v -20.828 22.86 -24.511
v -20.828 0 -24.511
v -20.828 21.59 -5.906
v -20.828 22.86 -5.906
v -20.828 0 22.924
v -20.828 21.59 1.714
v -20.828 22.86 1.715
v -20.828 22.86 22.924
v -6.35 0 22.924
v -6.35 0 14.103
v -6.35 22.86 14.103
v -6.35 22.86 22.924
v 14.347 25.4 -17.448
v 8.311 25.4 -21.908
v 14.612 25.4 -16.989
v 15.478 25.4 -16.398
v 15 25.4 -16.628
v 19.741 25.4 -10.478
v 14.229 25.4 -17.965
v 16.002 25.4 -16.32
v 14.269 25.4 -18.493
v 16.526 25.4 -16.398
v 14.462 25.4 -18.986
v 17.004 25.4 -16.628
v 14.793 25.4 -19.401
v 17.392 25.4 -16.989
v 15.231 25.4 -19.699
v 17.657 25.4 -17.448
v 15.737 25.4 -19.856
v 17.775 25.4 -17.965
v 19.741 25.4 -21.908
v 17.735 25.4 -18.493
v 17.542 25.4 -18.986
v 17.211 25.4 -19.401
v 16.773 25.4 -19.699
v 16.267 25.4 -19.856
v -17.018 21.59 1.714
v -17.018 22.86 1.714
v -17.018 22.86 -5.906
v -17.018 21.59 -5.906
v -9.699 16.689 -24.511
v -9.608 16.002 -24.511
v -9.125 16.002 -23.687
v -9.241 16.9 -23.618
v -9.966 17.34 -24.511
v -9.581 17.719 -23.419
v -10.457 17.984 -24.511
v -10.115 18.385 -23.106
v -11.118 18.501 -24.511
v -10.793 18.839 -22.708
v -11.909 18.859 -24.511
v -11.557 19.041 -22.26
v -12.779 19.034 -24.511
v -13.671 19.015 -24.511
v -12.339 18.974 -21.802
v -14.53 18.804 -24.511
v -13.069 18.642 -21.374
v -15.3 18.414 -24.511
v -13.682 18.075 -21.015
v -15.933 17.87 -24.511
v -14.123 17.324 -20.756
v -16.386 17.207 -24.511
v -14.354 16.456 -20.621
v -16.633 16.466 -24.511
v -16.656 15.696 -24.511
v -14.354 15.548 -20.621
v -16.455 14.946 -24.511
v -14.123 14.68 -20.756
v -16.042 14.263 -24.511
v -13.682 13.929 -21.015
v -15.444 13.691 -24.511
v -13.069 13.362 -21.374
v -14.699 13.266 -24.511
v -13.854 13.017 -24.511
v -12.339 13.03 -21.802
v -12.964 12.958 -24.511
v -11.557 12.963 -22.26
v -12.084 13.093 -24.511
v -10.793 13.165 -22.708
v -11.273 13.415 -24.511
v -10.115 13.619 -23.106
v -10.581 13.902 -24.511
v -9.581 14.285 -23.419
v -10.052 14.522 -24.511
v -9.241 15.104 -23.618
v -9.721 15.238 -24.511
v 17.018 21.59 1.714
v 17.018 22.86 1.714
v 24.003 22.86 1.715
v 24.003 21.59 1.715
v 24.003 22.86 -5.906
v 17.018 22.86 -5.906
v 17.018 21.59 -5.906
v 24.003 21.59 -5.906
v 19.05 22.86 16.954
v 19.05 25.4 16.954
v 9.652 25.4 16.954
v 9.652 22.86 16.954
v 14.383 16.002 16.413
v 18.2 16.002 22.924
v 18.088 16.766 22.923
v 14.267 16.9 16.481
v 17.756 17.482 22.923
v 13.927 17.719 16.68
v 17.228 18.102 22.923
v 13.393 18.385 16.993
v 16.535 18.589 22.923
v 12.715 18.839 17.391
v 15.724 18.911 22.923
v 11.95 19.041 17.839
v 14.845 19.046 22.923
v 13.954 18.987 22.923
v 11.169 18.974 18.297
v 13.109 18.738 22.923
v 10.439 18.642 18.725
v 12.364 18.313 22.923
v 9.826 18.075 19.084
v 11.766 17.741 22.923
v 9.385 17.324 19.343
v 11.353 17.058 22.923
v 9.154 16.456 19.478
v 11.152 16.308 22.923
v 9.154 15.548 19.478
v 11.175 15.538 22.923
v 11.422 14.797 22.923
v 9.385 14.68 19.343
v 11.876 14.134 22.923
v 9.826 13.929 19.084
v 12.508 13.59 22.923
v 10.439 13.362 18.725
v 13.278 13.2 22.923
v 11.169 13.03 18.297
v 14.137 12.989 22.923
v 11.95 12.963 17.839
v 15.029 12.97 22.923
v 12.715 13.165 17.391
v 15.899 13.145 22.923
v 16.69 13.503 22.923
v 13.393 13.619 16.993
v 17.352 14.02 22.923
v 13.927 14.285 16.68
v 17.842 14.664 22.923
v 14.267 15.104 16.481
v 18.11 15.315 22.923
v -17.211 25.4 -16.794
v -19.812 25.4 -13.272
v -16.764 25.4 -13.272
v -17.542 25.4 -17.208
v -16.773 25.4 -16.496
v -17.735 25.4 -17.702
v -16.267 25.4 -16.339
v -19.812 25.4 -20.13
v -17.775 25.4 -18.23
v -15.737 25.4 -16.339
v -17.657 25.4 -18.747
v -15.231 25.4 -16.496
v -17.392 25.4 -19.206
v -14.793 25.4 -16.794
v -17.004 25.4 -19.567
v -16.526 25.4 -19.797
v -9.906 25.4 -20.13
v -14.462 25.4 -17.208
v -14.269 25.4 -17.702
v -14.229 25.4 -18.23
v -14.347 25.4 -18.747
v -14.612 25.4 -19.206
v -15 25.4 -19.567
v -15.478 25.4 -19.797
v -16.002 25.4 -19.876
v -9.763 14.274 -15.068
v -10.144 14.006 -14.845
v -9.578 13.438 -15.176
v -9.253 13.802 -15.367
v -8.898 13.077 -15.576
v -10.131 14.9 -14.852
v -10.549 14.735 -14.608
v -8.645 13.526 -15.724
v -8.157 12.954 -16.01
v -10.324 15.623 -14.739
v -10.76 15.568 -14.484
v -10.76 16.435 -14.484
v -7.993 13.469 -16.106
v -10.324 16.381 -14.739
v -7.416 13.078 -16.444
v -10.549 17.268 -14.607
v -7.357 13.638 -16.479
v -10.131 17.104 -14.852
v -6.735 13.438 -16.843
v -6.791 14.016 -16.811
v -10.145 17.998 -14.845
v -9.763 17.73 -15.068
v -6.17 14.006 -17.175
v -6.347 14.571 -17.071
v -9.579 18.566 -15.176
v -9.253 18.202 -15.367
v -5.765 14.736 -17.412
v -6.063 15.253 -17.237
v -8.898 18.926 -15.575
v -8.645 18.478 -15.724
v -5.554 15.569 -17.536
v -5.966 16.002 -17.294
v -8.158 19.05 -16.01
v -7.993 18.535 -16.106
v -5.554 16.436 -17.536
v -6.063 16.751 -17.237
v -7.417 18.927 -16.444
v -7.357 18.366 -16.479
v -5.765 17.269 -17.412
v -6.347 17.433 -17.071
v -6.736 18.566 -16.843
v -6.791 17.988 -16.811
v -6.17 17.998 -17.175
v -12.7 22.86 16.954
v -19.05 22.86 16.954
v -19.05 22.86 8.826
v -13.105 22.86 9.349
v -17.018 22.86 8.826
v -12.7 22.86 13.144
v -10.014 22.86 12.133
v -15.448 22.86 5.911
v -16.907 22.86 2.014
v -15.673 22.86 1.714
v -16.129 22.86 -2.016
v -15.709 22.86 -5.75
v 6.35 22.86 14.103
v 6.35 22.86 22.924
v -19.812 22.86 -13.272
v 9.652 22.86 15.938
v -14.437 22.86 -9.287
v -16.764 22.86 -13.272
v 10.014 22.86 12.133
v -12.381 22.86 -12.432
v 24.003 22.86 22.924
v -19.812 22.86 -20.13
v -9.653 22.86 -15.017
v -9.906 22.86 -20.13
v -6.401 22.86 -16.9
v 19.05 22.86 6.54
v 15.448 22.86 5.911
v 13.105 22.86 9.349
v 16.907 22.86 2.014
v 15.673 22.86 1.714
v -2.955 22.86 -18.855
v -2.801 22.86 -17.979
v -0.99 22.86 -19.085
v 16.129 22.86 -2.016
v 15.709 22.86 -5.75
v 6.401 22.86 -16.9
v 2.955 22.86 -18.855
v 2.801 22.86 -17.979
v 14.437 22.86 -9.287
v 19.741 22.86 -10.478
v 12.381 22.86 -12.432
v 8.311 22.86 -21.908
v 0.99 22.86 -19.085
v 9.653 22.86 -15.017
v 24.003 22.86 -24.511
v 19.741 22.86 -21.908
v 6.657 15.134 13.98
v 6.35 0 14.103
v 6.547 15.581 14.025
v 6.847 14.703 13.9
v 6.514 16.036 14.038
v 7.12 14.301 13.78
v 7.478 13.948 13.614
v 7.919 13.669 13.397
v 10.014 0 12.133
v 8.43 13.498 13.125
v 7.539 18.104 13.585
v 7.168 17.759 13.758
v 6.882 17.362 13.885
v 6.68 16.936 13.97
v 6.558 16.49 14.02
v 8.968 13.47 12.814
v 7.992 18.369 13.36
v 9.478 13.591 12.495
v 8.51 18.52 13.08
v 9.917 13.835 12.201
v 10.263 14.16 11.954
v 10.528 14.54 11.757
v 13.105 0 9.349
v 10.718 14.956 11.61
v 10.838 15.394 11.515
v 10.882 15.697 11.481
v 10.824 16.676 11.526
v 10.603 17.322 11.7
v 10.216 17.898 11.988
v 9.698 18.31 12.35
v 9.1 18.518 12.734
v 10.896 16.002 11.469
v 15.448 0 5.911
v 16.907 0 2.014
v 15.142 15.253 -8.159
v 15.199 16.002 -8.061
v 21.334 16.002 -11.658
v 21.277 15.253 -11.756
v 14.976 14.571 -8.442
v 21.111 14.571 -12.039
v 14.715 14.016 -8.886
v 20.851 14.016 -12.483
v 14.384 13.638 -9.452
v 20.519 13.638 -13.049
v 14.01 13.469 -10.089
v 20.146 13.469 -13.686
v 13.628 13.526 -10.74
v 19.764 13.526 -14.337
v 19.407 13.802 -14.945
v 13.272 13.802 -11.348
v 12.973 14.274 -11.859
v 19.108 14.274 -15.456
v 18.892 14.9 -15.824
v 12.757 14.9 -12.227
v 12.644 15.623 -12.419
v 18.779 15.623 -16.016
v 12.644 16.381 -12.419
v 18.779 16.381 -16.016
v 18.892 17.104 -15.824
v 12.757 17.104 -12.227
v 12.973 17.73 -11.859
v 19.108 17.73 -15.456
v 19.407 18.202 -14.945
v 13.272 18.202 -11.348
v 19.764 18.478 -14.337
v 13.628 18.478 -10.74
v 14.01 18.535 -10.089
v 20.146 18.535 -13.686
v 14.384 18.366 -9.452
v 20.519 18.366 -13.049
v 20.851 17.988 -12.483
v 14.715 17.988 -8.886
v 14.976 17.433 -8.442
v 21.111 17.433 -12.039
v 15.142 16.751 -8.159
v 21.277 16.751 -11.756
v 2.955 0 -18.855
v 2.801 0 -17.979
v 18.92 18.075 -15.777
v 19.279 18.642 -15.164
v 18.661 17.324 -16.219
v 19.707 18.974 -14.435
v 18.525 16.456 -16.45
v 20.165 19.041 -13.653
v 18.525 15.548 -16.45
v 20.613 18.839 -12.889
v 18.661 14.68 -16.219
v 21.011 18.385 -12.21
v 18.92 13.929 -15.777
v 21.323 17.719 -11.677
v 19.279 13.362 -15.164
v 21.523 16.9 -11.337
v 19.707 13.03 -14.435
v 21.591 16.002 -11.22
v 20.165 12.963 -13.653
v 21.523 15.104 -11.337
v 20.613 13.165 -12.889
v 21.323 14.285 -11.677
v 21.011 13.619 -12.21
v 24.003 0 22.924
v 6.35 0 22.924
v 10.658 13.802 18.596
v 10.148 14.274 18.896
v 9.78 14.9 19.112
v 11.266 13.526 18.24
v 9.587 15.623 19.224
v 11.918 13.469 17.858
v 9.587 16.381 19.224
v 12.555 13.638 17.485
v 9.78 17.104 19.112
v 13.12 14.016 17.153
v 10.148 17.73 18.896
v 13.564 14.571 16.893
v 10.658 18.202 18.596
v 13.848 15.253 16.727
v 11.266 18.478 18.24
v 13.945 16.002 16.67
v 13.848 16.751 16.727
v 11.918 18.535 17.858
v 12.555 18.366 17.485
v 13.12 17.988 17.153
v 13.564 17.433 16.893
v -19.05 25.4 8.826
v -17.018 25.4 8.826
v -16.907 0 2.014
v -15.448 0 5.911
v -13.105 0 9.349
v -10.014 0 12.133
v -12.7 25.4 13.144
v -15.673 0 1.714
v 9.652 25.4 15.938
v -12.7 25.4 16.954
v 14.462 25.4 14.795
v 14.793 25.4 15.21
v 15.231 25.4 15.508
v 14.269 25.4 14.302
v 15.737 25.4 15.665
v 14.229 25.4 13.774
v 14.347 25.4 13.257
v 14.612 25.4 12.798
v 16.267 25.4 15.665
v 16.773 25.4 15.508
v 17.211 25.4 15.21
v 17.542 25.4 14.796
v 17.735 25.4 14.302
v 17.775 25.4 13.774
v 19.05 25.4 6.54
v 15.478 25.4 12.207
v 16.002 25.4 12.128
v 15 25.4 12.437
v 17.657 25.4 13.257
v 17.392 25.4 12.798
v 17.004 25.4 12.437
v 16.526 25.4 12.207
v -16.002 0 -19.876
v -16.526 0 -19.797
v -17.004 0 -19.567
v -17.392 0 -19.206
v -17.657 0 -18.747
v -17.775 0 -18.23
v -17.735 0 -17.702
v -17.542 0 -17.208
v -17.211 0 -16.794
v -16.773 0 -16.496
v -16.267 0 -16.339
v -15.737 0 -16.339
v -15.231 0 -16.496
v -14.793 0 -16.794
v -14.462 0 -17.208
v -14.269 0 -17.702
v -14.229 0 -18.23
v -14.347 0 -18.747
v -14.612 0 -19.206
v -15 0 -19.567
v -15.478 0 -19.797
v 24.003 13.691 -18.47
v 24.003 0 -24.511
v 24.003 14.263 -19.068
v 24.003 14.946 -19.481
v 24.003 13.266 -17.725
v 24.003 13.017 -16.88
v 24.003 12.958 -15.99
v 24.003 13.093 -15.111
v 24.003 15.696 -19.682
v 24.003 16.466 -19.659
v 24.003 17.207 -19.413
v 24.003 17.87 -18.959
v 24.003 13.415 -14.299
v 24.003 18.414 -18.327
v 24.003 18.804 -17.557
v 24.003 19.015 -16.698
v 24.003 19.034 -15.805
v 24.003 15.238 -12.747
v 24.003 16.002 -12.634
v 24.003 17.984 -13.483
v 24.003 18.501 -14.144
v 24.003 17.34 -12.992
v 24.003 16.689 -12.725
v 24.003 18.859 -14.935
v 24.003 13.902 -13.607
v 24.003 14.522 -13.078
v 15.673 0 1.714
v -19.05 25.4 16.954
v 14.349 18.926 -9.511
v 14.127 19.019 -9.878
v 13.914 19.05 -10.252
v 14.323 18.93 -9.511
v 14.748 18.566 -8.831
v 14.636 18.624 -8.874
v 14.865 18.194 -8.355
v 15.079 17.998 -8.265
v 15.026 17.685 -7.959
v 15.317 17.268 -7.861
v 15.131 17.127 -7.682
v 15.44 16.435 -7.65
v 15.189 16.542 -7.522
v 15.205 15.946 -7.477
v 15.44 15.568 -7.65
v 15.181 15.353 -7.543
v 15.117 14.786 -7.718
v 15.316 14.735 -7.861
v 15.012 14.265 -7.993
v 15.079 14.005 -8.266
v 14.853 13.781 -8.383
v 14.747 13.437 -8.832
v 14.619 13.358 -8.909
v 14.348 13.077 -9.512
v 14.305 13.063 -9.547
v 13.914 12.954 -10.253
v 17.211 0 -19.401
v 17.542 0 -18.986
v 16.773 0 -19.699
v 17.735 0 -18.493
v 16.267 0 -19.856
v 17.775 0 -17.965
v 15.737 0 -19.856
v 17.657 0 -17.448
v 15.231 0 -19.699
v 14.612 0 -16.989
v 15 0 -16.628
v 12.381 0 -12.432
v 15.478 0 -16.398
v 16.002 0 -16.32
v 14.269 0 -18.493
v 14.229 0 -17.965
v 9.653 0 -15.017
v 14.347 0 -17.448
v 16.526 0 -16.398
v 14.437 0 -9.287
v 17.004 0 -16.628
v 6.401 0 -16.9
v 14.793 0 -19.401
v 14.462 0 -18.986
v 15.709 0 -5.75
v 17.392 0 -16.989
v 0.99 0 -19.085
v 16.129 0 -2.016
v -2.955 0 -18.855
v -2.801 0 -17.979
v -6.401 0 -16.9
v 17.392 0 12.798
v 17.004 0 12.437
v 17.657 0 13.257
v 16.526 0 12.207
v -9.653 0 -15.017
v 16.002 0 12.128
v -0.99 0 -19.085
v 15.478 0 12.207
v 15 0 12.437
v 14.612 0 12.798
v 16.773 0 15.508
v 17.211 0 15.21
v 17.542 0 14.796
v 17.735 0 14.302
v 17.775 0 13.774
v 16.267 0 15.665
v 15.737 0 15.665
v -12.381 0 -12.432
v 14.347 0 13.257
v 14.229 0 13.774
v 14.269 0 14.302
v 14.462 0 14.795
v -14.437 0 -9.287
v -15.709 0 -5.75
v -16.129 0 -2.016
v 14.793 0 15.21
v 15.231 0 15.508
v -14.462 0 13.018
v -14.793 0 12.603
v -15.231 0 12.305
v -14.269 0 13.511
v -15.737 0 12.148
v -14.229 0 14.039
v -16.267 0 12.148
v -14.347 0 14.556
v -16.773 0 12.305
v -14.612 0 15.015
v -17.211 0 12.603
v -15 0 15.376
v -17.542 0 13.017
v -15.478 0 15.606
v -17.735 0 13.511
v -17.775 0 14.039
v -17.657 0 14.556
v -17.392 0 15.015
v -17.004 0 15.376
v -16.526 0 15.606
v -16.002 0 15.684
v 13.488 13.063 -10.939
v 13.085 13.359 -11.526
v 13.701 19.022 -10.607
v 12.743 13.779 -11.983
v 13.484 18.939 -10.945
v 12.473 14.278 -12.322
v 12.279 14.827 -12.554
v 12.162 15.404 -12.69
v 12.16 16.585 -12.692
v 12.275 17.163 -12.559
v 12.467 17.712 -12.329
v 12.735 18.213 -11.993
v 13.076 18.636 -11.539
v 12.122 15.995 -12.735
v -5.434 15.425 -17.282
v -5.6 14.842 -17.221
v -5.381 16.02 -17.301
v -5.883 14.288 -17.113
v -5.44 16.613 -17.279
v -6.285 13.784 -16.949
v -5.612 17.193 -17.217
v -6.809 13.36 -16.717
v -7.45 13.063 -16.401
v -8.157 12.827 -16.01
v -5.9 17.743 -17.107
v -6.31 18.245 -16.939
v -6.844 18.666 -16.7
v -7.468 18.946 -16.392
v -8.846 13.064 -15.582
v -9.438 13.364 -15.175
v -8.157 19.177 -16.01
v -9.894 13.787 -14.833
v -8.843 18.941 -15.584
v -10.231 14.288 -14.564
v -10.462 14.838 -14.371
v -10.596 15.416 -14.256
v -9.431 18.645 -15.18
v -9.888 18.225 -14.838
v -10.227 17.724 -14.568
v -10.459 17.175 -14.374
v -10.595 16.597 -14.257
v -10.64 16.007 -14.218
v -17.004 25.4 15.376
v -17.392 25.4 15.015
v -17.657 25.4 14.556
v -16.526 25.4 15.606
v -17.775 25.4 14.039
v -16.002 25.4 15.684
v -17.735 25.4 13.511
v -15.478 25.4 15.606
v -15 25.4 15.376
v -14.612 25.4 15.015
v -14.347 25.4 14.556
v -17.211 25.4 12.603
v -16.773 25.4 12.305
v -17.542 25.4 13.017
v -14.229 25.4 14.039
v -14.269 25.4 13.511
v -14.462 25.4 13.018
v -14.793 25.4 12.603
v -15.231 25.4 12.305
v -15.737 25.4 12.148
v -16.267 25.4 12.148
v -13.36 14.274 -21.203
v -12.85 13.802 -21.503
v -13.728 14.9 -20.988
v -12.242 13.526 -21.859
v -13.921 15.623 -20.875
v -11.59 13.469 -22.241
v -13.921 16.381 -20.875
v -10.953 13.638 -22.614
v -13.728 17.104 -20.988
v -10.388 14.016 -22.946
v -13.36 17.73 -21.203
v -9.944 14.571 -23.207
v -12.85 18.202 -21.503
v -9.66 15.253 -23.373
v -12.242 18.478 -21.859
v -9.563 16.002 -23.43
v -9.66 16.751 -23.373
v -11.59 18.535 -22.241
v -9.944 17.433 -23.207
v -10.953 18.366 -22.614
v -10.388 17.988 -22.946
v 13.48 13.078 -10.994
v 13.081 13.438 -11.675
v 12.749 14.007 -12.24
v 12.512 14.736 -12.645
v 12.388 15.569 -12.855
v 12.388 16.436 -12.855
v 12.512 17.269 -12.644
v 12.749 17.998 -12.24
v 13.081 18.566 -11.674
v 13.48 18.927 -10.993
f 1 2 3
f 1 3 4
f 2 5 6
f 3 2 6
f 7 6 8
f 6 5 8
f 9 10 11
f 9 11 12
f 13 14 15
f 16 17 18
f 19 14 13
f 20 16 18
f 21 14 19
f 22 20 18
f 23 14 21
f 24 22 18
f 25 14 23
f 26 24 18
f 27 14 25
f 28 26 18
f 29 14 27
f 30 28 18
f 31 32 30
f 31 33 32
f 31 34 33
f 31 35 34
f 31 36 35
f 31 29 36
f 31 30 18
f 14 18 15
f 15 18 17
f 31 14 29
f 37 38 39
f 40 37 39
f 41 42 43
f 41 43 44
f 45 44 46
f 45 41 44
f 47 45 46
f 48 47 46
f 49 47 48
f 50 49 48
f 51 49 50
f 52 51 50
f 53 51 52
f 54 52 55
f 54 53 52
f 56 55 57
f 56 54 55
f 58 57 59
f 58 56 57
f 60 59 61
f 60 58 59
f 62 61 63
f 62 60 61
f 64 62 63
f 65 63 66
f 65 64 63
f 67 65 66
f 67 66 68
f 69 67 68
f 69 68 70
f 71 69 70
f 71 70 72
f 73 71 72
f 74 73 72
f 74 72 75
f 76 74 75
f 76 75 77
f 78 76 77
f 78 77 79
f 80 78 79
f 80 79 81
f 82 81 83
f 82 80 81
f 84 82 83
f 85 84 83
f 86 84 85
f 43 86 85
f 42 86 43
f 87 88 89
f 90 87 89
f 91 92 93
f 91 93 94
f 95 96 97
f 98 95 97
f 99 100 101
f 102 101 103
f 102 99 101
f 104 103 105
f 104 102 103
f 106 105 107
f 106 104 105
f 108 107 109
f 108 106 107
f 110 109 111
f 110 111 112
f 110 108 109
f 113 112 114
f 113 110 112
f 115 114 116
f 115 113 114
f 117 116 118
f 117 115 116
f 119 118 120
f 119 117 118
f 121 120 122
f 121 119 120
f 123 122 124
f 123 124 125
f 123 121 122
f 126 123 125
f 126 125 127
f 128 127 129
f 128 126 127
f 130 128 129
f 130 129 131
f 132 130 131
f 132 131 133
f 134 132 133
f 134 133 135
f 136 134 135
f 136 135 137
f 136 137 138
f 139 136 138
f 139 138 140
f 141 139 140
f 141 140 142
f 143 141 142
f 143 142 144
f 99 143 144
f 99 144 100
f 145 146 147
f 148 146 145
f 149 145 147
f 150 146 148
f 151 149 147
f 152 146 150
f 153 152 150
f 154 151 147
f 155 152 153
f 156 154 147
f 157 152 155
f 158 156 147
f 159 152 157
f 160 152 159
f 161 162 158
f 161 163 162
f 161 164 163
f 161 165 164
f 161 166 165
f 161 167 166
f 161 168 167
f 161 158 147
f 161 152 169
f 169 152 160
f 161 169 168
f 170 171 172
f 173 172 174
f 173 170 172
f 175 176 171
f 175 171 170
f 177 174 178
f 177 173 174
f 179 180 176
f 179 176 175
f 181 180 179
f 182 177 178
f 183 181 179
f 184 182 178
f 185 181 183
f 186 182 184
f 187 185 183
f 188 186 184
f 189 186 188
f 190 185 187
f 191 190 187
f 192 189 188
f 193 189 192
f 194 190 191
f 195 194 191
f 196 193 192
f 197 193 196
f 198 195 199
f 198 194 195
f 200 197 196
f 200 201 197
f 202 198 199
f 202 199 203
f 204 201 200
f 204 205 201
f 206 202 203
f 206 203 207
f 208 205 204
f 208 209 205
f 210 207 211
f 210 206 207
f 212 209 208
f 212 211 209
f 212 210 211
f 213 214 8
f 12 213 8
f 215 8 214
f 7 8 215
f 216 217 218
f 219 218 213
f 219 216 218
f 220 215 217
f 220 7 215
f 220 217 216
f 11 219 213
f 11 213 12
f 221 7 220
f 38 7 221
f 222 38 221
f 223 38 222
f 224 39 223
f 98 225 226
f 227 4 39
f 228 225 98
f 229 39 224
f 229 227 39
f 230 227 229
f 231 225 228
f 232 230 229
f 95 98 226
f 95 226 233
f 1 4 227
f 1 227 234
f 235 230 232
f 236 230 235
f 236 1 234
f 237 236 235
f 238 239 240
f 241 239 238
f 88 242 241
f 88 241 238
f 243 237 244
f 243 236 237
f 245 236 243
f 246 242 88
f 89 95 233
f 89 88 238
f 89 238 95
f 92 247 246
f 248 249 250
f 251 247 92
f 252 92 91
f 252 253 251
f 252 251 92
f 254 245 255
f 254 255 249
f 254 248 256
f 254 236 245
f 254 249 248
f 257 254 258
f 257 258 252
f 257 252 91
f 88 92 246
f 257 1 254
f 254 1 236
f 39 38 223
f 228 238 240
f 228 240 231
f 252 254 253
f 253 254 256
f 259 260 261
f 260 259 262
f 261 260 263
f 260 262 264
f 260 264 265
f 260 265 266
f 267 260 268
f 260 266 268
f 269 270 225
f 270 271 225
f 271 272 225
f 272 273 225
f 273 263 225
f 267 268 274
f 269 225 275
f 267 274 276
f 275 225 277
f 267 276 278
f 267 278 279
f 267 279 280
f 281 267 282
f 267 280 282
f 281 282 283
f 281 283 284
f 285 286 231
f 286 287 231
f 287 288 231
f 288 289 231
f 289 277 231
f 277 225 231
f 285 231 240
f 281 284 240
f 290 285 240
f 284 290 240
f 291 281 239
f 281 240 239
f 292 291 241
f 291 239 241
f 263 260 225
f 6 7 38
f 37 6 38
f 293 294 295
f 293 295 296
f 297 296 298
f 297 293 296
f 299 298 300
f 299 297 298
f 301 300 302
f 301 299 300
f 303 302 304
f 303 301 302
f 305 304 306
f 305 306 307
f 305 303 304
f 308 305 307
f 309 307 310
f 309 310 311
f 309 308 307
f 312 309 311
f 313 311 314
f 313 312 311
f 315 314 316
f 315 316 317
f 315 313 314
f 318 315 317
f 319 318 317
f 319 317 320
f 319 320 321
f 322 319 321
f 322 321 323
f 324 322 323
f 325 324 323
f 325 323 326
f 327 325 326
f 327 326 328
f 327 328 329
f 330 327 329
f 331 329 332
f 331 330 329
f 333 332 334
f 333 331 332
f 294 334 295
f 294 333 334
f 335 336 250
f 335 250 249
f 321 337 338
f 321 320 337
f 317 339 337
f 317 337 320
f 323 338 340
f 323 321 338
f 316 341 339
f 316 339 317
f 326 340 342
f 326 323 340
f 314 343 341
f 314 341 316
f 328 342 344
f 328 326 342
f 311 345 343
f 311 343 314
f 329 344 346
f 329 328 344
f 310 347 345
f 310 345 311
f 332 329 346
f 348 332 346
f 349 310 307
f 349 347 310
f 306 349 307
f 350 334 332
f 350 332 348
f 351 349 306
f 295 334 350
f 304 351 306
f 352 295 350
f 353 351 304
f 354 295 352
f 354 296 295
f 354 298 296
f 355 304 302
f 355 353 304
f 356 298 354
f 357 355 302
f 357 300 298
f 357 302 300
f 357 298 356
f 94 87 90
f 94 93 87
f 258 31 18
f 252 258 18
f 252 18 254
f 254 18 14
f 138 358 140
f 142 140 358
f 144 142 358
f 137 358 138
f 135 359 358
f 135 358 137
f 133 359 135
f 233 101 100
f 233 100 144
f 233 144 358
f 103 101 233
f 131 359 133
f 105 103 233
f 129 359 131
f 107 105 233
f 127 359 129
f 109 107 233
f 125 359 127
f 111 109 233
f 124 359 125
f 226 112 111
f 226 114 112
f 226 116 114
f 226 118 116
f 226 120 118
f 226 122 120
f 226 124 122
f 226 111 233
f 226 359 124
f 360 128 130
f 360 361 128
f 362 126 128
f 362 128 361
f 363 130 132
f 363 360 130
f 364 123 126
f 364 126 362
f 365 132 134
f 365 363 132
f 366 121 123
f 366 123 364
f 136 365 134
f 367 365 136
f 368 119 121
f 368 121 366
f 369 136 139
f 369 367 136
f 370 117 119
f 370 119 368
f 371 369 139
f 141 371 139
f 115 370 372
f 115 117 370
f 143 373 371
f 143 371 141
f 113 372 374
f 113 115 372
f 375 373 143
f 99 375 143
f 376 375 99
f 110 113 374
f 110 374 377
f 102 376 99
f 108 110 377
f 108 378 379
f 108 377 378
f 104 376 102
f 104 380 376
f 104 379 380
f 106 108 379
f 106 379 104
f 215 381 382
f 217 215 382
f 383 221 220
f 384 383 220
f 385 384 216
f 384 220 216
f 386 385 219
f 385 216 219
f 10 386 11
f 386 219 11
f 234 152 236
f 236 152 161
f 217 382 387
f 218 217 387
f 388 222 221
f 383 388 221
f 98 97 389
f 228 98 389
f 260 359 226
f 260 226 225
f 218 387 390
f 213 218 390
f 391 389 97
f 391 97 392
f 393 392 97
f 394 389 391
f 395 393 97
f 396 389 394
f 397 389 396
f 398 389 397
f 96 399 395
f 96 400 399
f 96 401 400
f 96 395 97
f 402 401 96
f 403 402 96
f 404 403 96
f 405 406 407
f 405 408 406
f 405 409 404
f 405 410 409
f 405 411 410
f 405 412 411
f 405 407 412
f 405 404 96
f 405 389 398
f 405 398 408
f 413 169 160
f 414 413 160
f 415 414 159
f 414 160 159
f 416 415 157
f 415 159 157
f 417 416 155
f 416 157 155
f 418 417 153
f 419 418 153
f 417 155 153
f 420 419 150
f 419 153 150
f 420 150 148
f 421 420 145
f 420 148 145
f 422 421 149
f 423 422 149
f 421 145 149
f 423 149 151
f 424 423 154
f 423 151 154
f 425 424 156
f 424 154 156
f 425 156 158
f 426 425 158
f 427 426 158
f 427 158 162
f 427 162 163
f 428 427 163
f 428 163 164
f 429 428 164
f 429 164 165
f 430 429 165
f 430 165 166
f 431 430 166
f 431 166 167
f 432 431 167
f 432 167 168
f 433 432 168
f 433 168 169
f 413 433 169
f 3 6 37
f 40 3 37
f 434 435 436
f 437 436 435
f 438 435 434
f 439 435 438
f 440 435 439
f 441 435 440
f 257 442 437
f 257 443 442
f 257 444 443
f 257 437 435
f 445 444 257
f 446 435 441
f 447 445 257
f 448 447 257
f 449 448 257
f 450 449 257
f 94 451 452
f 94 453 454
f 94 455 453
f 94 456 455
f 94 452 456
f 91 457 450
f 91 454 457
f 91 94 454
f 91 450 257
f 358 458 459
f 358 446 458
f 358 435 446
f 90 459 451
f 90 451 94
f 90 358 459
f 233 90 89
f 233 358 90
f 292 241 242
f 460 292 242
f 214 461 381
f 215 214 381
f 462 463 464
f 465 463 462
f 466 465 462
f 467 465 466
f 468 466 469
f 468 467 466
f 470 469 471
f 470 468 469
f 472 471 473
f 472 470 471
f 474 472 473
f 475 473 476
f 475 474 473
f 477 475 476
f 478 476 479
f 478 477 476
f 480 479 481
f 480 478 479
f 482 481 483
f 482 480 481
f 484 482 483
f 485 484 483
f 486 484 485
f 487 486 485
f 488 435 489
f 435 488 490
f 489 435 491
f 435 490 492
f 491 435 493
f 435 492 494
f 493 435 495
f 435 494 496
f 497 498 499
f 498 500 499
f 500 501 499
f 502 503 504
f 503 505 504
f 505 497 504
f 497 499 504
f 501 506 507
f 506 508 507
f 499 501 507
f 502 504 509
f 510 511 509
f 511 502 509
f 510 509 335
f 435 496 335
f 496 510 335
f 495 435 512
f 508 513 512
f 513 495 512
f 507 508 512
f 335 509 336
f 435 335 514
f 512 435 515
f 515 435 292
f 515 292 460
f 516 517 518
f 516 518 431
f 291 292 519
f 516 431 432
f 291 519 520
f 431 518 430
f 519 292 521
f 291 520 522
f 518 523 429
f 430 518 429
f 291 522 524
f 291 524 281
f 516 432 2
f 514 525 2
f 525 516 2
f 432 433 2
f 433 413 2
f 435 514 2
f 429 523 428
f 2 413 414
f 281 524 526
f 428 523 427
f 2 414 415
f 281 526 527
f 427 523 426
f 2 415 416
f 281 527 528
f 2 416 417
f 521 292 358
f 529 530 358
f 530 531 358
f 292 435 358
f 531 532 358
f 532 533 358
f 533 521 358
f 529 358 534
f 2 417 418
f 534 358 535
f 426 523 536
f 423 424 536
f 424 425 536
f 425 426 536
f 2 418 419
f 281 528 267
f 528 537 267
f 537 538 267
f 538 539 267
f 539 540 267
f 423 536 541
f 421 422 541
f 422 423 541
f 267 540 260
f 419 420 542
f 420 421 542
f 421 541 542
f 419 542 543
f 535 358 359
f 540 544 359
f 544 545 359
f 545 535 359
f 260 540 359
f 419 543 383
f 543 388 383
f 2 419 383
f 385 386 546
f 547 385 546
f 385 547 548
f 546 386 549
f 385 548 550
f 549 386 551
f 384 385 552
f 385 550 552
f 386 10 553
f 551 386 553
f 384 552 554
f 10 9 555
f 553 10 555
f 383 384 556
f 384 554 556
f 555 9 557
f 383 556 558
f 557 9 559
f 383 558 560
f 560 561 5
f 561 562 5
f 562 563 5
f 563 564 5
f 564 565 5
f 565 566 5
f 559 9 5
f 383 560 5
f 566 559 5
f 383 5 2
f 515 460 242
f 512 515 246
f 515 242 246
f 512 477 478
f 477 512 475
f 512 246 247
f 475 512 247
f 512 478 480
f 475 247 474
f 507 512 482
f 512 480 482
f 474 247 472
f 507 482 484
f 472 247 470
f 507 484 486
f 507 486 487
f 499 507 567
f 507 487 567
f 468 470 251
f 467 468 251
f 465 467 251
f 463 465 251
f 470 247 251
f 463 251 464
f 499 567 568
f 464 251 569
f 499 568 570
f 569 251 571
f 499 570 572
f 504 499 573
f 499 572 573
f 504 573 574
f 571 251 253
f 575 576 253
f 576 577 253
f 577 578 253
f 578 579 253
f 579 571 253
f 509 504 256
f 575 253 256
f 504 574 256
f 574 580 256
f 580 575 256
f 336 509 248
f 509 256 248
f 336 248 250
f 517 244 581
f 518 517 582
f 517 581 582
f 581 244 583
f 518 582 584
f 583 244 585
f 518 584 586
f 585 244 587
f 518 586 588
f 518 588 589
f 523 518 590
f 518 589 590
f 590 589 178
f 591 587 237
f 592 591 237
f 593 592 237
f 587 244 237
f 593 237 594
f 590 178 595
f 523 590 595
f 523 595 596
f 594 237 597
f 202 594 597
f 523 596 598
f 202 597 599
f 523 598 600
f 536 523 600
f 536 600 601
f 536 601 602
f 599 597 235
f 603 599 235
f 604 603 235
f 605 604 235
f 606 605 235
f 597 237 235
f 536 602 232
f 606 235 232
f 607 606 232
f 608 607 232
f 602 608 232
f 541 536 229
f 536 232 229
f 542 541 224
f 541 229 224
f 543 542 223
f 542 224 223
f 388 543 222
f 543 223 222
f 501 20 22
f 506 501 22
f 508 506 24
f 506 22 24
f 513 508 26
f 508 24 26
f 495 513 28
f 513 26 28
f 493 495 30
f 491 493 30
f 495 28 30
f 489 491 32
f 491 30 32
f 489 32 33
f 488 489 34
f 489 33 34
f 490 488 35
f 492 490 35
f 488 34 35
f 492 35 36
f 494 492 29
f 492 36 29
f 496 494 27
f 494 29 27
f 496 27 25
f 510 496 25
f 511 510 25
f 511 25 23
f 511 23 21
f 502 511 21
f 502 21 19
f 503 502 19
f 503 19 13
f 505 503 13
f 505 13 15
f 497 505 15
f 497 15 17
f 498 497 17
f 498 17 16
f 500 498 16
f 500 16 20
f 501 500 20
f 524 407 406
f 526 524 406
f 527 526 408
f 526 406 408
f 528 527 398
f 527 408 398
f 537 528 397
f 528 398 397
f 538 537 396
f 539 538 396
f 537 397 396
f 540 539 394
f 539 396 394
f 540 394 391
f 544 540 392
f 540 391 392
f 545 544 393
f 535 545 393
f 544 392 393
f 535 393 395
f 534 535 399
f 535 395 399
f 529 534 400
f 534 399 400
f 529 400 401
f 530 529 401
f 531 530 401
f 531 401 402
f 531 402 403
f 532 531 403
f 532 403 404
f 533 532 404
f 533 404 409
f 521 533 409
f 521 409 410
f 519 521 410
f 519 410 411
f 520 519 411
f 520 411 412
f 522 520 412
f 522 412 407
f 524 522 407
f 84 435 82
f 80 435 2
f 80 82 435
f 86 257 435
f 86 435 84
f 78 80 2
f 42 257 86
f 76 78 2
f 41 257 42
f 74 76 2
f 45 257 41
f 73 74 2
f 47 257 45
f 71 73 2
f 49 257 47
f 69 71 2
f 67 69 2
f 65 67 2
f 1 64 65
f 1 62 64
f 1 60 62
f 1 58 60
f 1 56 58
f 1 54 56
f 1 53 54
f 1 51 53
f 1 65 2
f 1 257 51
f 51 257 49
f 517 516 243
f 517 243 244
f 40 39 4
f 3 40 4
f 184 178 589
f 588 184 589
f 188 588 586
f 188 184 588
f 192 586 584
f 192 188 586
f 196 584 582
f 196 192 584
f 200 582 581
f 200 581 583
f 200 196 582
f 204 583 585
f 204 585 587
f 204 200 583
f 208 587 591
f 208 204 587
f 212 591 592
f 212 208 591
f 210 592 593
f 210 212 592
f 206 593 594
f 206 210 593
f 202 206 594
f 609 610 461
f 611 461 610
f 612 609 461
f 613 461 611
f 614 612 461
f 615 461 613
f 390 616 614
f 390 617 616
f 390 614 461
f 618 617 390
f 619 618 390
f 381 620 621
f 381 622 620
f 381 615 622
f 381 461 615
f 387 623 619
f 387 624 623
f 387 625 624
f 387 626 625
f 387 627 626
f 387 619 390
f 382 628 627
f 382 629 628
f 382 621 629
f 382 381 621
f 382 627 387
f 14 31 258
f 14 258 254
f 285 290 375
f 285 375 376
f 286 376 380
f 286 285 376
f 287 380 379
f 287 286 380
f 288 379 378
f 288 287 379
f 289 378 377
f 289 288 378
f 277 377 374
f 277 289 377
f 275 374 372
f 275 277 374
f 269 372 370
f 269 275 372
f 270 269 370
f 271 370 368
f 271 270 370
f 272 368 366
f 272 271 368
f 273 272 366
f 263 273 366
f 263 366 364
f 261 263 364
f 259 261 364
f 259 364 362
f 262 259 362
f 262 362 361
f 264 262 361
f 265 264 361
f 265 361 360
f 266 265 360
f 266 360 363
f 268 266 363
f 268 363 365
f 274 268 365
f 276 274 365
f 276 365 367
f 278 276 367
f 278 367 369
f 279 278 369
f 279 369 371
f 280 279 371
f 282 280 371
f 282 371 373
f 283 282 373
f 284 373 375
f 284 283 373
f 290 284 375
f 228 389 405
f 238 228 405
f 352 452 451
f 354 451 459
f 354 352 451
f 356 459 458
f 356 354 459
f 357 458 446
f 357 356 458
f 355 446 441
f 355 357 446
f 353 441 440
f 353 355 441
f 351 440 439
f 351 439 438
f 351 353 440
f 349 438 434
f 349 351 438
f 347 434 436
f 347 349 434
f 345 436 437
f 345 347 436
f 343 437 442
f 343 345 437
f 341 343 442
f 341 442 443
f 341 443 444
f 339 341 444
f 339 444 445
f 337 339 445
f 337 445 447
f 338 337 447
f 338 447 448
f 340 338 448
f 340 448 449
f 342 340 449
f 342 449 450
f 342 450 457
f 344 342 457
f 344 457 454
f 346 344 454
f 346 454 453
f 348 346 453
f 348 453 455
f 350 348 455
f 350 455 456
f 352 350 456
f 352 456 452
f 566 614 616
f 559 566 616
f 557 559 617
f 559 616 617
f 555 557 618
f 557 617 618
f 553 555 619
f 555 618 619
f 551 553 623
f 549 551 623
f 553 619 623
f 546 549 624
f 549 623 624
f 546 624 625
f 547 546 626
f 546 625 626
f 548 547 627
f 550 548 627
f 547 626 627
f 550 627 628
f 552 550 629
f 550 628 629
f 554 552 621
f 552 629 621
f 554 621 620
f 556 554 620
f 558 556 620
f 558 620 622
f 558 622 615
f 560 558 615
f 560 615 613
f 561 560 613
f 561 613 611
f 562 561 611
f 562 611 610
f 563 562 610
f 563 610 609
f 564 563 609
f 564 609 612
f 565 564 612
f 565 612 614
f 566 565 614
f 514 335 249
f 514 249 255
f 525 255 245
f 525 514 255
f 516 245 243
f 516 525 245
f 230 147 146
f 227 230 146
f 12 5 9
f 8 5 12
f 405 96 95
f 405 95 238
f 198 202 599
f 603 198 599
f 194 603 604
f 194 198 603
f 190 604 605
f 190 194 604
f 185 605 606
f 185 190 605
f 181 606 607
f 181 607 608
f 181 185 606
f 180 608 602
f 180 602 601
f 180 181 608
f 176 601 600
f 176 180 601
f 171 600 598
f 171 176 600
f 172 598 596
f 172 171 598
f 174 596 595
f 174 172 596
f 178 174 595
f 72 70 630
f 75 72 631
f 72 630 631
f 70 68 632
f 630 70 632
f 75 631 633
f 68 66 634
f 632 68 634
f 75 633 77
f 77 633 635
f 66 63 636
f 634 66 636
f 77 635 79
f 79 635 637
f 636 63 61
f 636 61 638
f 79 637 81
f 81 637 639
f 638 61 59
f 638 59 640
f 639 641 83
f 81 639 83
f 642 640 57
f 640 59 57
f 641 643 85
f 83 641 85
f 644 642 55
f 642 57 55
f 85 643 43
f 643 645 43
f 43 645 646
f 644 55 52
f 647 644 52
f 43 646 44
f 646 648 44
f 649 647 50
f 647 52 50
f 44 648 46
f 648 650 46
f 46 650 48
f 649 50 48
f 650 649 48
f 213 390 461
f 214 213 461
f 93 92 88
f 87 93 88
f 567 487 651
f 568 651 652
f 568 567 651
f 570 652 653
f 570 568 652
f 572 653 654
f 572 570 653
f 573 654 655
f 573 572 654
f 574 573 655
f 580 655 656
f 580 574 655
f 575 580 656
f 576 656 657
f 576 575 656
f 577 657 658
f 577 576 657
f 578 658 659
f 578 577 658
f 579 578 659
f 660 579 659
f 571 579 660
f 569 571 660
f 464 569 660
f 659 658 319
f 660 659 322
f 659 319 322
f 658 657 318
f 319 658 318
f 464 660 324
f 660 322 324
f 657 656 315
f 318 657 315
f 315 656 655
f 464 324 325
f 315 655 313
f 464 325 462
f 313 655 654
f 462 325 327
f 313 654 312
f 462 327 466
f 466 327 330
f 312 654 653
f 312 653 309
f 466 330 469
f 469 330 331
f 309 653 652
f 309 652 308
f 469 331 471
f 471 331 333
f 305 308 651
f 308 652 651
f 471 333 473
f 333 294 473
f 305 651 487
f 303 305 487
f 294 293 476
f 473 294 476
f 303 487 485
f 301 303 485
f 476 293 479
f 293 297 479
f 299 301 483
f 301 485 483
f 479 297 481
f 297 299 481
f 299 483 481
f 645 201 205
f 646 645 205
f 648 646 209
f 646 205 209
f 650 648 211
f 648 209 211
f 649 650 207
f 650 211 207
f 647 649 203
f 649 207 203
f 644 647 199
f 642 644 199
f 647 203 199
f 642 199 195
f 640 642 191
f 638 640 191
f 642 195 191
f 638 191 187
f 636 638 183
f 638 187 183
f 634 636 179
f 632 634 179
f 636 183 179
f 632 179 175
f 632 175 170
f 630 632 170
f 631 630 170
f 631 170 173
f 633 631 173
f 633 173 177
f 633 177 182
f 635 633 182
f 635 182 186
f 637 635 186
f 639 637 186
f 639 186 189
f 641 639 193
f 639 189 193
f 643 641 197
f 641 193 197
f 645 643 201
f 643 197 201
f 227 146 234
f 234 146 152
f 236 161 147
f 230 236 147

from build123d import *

# Parameters (mm, degrees)
SKETCH1_W                 = 41.656
SKETCH1_H                 = 45.847
BOSS_EXTRUDE1_DEPTH       = 25.4
SKETCH2_R                 = 16.129
CUT_EXTRUDE1_DEPTH        = 25.4
CUT_EXTRUDE2_DEPTH        = 3.81
CUT_EXTRUDE6_START        = -25.4
CUT_EXTRUDE6_DEPTH        = 25.4
CUT_EXTRUDE7_REACH        = 58.4
CUT_EXTRUDE7_END_RADIUS   = 16.129
SKETCH7_R                 = 3.048
SKETCH14_W                = 2.524584731
SKETCH14_H                = 21.209
SKETCH14_W_2              = 2.54
SKETCH14_W_3              = 7.43654476
SKETCH14_H_2              = 2.672753785
CUT_EXTRUDE10_DEPTH       = 2.54
SKETCH17_W                = 45.847
SKETCH17_H                = 22.86
BOSS_EXTRUDE3_DEPTH       = 3.175
CUT_EXTRUDE12_REACH       = 43.576
SKETCH12_R                = 3.048
SKETCH18_W                = 44.831
SKETCH18_H                = 22.86
BOSS_EXTRUDE4_DEPTH       = 1.5875
CUT_EXTRUDE13_DEPTH       = 44.190833792
CUT_EXTRUDE13_DEPTH_BACK  = 44.190833792
SKETCH11_R                = 3.048
SKETCH4_R                 = 1.778
CUT_EXTRUDE14_DEPTH       = 43.685983001
SKETCH19_R                = 3.175
SKETCH19_R_2              = 2.54
BOSS_EXTRUDE5_DEPTH       = 7.112
CIRPATTERN3_START         = 14.321246389
CIRPATTERN3_OUTLINE_R     = 3.048
CIRPATTERN3_OUTLINE_R_2   = 2.54
CIRPATTERN3_DEPTH         = 7.112
CIRPATTERN3_START_2       = 17.188786362
CIRPATTERN3_2_OUTLINE_R   = 3.048
CIRPATTERN3_2_OUTLINE_R_2 = 2.54
CIRPATTERN3_2_DEPTH       = 7.112
CIRPATTERN3_START_3       = 14.033500302
CIRPATTERN3_3_OUTLINE_W   = 10
CIRPATTERN3_3_OUTLINE_H   = 10
CIRPATTERN3_3_OUTLINE_R   = 2.54
CIRPATTERN3_3_DEPTH       = 7.112
SKETCH20_W                = 1.508584731
SKETCH20_H                = 6.858
SKETCH20_W_2              = 0.746584731
SKETCH20_H_2              = 8.128
BOSS_EXTRUDE6_DEPTH       = 2.54
SKETCH20_5_W              = 7.43654476
SKETCH20_5_H              = 2.672753785
CUT_EXTRUDE17_DEPTH       = 2.54
SKETCH21_W                = 3.175
SKETCH21_H                = 7.62
CUT_EXTRUDE18_DEPTH       = 1.27
CUT_EXTRUDE19_DEPTH       = 22.86


# Read off the part's stored shape, not the designer's step: CirPattern3
with BuildPart() as part:
    # Sketch1 → Boss-Extrude1 (new body)
    with BuildSketch(Plane(origin=(0, 0, 0), x_dir=(1, 0, 0), z_dir=(0, 1, 0))):
        Rectangle(SKETCH1_W, SKETCH1_H)
    extrude(amount=BOSS_EXTRUDE1_DEPTH)

    # Sketch2 → Cut-Extrude1 (cut)
    with BuildSketch(Plane(origin=(0, 25.4, 0), x_dir=(1, 0, 0), z_dir=(0, 1, 0))):
        with Locations(Location((0, 2.0955, 0), (0, 0, 270))):
            Circle(SKETCH2_R)
    extrude(amount=-CUT_EXTRUDE1_DEPTH, mode=Mode.SUBTRACT)

    # Sketch3 → Cut-Extrude2 (cut)
    with BuildSketch(Plane(origin=(0, 25.4, 0), x_dir=(1, 0, 0), z_dir=(0, 1, 0))):
        Polygon((17.018, -1.7145), (19.812, -1.7145), (20.828, -1.7145), (20.828, 5.9055), (17.018, 5.9055), align=None)
        Polygon((-17.018, 5.9055), (-19.812, 5.9055), (-20.828, 5.9055), (-20.828, -1.7145), (-19.812, -1.7145), (-17.018, -1.7145), align=None)
    extrude(amount=-CUT_EXTRUDE2_DEPTH, mode=Mode.SUBTRACT)

    # Sketch6 → Cut-Extrude6 (cut)
    with BuildSketch(Plane(origin=(0, 25.4, 0), x_dir=(1, 0, 0), z_dir=(0, 1, 0)).offset(CUT_EXTRUDE6_START)):
        with BuildLine():
            ThreePointArc((-2.800771458, 17.979464248), (-1.405734975, 18.163124286), (0, 18.2245))
            ThreePointArc((0, 18.2245), (1.405734975, 18.163124286), (2.800771458, 17.979464248))
            Line((2.800771458, 17.979464248), (2.955144688, 18.854958341))
            ThreePointArc((2.955144688, 18.854958341), (0, 19.1135), (-2.955144688, 18.854958341))
            Line((-2.955144688, 18.854958341), (-2.800771458, 17.979464248))
        make_face()
        with BuildLine():
            Line((0, 18.2245), (0, 2.0955))
            Line((0, 2.0955), (2.800771458, 17.979464248))
            ThreePointArc((2.800771458, 17.979464248), (1.405734975, 18.163124286), (0, 18.2245))
        make_face()
        with BuildLine():
            Line((-2.800771458, 17.979464248), (0, 2.0955))
            Line((0, 2.0955), (0, 18.2245))
            ThreePointArc((0, 18.2245), (-1.405734975, 18.163124286), (-2.800771458, 17.979464248))
        make_face()
    extrude(amount=CUT_EXTRUDE6_DEPTH, mode=Mode.SUBTRACT)

    # Cut-Extrude7: up to this cylinder (the profile starts outside it)
    cut_extrude7_end = Plane(origin=(0, 16.002, -2.0955), z_dir=(0, 1, 0)) * Cylinder(CUT_EXTRUDE7_END_RADIUS, 150.058, mode=Mode.PRIVATE)
    # Sketch7 → Cut-Extrude7 (cut, up to the surface)
    with BuildSketch(Plane.XY.offset(22.9235), mode=Mode.PRIVATE) as cut_extrude7_sk1:
        with Locations((0, 16.002)):
            Circle(SKETCH7_R)
    cut_extrude7_tool1 = extrude(cut_extrude7_sk1.sketch, amount=-CUT_EXTRUDE7_REACH, mode=Mode.PRIVATE) - cut_extrude7_end
    add(cut_extrude7_tool1.solids().sort_by_distance((0, 16.002, 22.9235))[0], mode=Mode.SUBTRACT)

    # Sketch14 → Cut-Extrude10 (cut)
    with BuildSketch(Plane(origin=(0, 25.4, 0), x_dir=(1, 0, 0), z_dir=(0, 1, 0))):
        Polygon((20.828, 22.9235), (-20.828, 22.9235), (-20.828, 5.9055), (-18.303415269, 5.9055), (-18.303415269, 20.3835), (20.828, 20.3835), align=None)
        with Locations((-19.565707635, -12.319)):
            Rectangle(SKETCH14_W, SKETCH14_H)
        with Locations((19.558, -12.319)):
            Rectangle(SKETCH14_W_2, SKETCH14_H)
        with Locations((0, -20.25731759)):
            Rectangle(SKETCH14_W_3, SKETCH14_H_2)
    extrude(amount=-CUT_EXTRUDE10_DEPTH, mode=Mode.SUBTRACT)

    # Sketch17 → Boss-Extrude3 (add)
    with BuildSketch(Plane(origin=(20.828, 0, 0), x_dir=(0, 0, -1), z_dir=(1, 0, 0))):
        with Locations((0, 11.43)):
            Rectangle(SKETCH17_W, SKETCH17_H)
    extrude(amount=BOSS_EXTRUDE3_DEPTH)

    # Cut-Extrude12: up to this plane
    cut_extrude12_end = Plane(origin=(24.003, 0, 0), z_dir=(1, 0, 0))
    # Sketch12 → Cut-Extrude12 (cut, up to the surface)
    with BuildSketch(Plane(origin=(0.914260378, 0, -0.535980498), x_dir=(-0.50574390925612, 0, -0.862683660590797), z_dir=(0.862683660590797, 0, -0.50574390925612)), mode=Mode.PRIVATE) as cut_extrude12_sk1:
        with Locations(Location((1.807753611, 16.002, 0), (0, 0, 180))):
            Circle(SKETCH12_R)
    cut_extrude12_tool1 = split(extrude(cut_extrude12_sk1.sketch, amount=CUT_EXTRUDE12_REACH, mode=Mode.PRIVATE), bisect_by=cut_extrude12_end, keep=Keep.BOTH, mode=Mode.PRIVATE)
    add(cut_extrude12_tool1.solids().sort_by_distance((0, 16.002, -2.0955))[0], mode=Mode.SUBTRACT)

    # Sketch18 → Boss-Extrude4 (add)
    with BuildSketch(Plane(origin=(0, 0, -22.9235), x_dir=(-1, 0, 0), z_dir=(0, 0, -1))):
        with Locations((-1.5875, 11.43)):
            Rectangle(SKETCH18_W, SKETCH18_H)
    extrude(amount=BOSS_EXTRUDE4_DEPTH)

    # Sketch11 → Cut-Extrude13 (cut, two sides: drawn at the far end of the back side and taken through both)
    with BuildSketch(Plane(origin=(-0.914260378, 0, -1.559519502), x_dir=(0.862683660590797, 0, -0.50574390925612), z_dir=(0.50574390925612, 0, 0.862683660590797)).offset(-CUT_EXTRUDE13_DEPTH_BACK)):
        with Locations((1.059786362, 16.002)):
            Circle(SKETCH11_R)
    extrude(amount=CUT_EXTRUDE13_DEPTH + CUT_EXTRUDE13_DEPTH_BACK, mode=Mode.SUBTRACT)

    # Sketch4 → Cut-Extrude14 (cut, through all)
    with BuildSketch(Plane(origin=(0, 25.4, 0), x_dir=(1, 0, 0), z_dir=(0, 1, 0))):
        with Locations(Location((-16.002, -13.9065, 0), (0, 0, 270))):
            Circle(SKETCH4_R)
        with Locations(Location((-16.002, 18.0975, 0), (0, 0, 90))):
            Circle(SKETCH4_R)
        with Locations(Location((16.002, 18.0975, 0), (0, 0, 270))):
            Circle(SKETCH4_R)
        with Locations(Location((16.002, -13.9065, 0), (0, 0, 90))):
            Circle(SKETCH4_R)
    extrude(amount=-CUT_EXTRUDE14_DEPTH, mode=Mode.SUBTRACT)

    # Sketch19 → Boss-Extrude5 (add)
    with BuildSketch(Plane(origin=(-9.07140389, 0, -15.473744264), x_dir=(0.8626836605907969, 0, -0.5057439092561202), z_dir=(0.5057439092561202, 0, 0.8626836605907969))):
        with Locations((1.059786362, 16.002)):
            Circle(SKETCH19_R)
        with Locations((1.059786362, 16.002)):
            Circle(SKETCH19_R_2, mode=Mode.SUBTRACT)
    extrude(amount=-BOSS_EXTRUDE5_DEPTH)

    # CirPattern3 outline → CirPattern3 (add)
    with BuildSketch(Plane(origin=(0, 0, 0), x_dir=(0.8626836605907969, 0, -0.5057439092561199), z_dir=(0.50574390925612, 0, 0.862683660590797)).offset(CIRPATTERN3_START)):
        with Locations((1.059786362, 16.002)):
            Circle(CIRPATTERN3_OUTLINE_R)
        with Locations((1.059786362, 16.002)):
            Circle(CIRPATTERN3_OUTLINE_R_2, mode=Mode.SUBTRACT)
    extrude(amount=CIRPATTERN3_DEPTH)

    # CirPattern3 2 outline → CirPattern3 2 (add)
    with BuildSketch(Plane(origin=(0, 0, 0), x_dir=(0.5057439092561169, 0, 0.8626836605907988), z_dir=(0.8626836605907988, 0, -0.5057439092561169)).offset(CIRPATTERN3_START_2)):
        with Locations((-1.807753611, -16.002)):
            Circle(CIRPATTERN3_2_OUTLINE_R)
        with Locations((-1.807753611, -16.002)):
            Circle(CIRPATTERN3_2_OUTLINE_R_2, mode=Mode.SUBTRACT)
    extrude(amount=CIRPATTERN3_2_DEPTH)

    # CirPattern3 3 outline → CirPattern3 3 (add)
    with BuildSketch(Plane(origin=(0, 0, 0), x_dir=(0.9999998560090501, 0, -0.0005366394310553081), z_dir=(0.0005366394310553081, 0, 0.9999998560090502)).offset(CIRPATTERN3_START_3)):
        with Locations((0, 16)):
            Rectangle(CIRPATTERN3_3_OUTLINE_W, CIRPATTERN3_3_OUTLINE_H)
        with Locations((0.001124528, 16.002)):
            Circle(CIRPATTERN3_3_OUTLINE_R, mode=Mode.SUBTRACT)
    extrude(amount=CIRPATTERN3_3_DEPTH)

    # Sketch20 → Boss-Extrude6 (add)
    with BuildSketch(Plane(origin=(0, 25.4, 0), x_dir=(1, 0, 0), z_dir=(0, 1, 0))):
        Polygon((9.835016705, 20.3835), (19.741016705, 20.3835), (19.741016705, 21.9075), (8.311016705, 21.9075), align=None)
        with Locations((-19.057707635, 16.7005)):
            Rectangle(SKETCH20_W, SKETCH20_H)
        Polygon((19.05, -6.5405), (18.288, -7.3025), (18.288, -16.9545), (19.05, -16.9545), align=None)
        with Locations((-18.676707635, -12.8905)):
            Rectangle(SKETCH20_W_2, SKETCH20_H_2)
    extrude(amount=-BOSS_EXTRUDE6_DEPTH)

    # Sketch20<5> → Cut-Extrude17 (cut)
    with BuildSketch(Plane(origin=(0, 25.4, 0), x_dir=(1, 0, 0), z_dir=(0, 1, 0))):
        Polygon((19.741016705, 20.3835), (19.741016705, 18.0975), (19.741016705, 10.4775), (9.835016705, 20.3835), (-18.303415269, 20.3835), (-18.303415269, 20.1295), (-16.002, 20.1295), (-9.906, 20.1295), (-16.764, 13.2715), (-18.303415269, 13.2715), (-18.303415269, 5.9055), (-17.018, 5.9055), (-17.018, -1.7145), (-18.303415269, -1.7145), (-18.303415269, -8.8265), (-17.018, -8.8265), (-12.7, -13.1445), (-12.7, -16.9545), (-16.002, -16.9545), (-18.303415269, -16.9545), (-18.303415269, -22.9235), (18.288, -22.9235), (18.288, -16.9545), (16.002, -16.9545), (9.652, -16.9545), (9.652, -15.9385), (18.288, -7.3025), (18.288, -1.7145), (17.018, -1.7145), (17.018, 5.9055), (20.828, 5.9055), (20.828, 20.3835), align=None)
        with Locations((0, -20.25731759)):
            Rectangle(SKETCH20_5_W, SKETCH20_5_H, mode=Mode.SUBTRACT)
        with BuildLine():
            ThreePointArc((2.800771458, 17.979464248), (0, -14.0335), (-2.800771458, 17.979464248))
            Line((-2.800771458, 17.979464248), (-2.955144688, 18.854958341))
            ThreePointArc((-2.955144688, 18.854958341), (0, 19.1135), (2.955144688, 18.854958341))
            Line((2.955144688, 18.854958341), (2.800771458, 17.979464248))
        make_face(mode=Mode.SUBTRACT)
    extrude(amount=-CUT_EXTRUDE17_DEPTH, mode=Mode.SUBTRACT)

    # Sketch21 → Cut-Extrude18 (cut)
    with BuildSketch(Plane(origin=(0, 22.86, 0), x_dir=(1, 0, 0), z_dir=(0, 1, 0))):
        with Locations((22.4155, 2.0955)):
            Rectangle(SKETCH21_W, SKETCH21_H)
    extrude(amount=-CUT_EXTRUDE18_DEPTH, mode=Mode.SUBTRACT)

    # Sketch22 → Cut-Extrude19 (cut)
    with BuildSketch(Plane(origin=(0, 22.86, 0), x_dir=(1, 0, 0), z_dir=(0, 1, 0))):
        with BuildLine():
            ThreePointArc((15.672540987, -1.7145), (0, -14.0335), (-15.672540987, -1.7145))
            Line((-15.672540987, -1.7145), (-16.906599333, -2.0145))
            ThreePointArc((-16.906599333, -2.0145), (-13.10543472, -9.348834048), (-6.35, -14.103348755))
            Line((-6.35, -14.103348755), (-6.35, -22.9235))
            Line((-6.35, -22.9235), (6.35, -22.9235))
            Line((6.35, -22.9235), (6.35, -14.103348755))
            ThreePointArc((6.35, -14.103348755), (13.10543472, -9.348834048), (16.906599333, -2.0145))
            Line((16.906599333, -2.0145), (15.672540987, -1.7145))
        make_face()
    extrude(amount=-CUT_EXTRUDE19_DEPTH, mode=Mode.SUBTRACT)


solid = part.part
